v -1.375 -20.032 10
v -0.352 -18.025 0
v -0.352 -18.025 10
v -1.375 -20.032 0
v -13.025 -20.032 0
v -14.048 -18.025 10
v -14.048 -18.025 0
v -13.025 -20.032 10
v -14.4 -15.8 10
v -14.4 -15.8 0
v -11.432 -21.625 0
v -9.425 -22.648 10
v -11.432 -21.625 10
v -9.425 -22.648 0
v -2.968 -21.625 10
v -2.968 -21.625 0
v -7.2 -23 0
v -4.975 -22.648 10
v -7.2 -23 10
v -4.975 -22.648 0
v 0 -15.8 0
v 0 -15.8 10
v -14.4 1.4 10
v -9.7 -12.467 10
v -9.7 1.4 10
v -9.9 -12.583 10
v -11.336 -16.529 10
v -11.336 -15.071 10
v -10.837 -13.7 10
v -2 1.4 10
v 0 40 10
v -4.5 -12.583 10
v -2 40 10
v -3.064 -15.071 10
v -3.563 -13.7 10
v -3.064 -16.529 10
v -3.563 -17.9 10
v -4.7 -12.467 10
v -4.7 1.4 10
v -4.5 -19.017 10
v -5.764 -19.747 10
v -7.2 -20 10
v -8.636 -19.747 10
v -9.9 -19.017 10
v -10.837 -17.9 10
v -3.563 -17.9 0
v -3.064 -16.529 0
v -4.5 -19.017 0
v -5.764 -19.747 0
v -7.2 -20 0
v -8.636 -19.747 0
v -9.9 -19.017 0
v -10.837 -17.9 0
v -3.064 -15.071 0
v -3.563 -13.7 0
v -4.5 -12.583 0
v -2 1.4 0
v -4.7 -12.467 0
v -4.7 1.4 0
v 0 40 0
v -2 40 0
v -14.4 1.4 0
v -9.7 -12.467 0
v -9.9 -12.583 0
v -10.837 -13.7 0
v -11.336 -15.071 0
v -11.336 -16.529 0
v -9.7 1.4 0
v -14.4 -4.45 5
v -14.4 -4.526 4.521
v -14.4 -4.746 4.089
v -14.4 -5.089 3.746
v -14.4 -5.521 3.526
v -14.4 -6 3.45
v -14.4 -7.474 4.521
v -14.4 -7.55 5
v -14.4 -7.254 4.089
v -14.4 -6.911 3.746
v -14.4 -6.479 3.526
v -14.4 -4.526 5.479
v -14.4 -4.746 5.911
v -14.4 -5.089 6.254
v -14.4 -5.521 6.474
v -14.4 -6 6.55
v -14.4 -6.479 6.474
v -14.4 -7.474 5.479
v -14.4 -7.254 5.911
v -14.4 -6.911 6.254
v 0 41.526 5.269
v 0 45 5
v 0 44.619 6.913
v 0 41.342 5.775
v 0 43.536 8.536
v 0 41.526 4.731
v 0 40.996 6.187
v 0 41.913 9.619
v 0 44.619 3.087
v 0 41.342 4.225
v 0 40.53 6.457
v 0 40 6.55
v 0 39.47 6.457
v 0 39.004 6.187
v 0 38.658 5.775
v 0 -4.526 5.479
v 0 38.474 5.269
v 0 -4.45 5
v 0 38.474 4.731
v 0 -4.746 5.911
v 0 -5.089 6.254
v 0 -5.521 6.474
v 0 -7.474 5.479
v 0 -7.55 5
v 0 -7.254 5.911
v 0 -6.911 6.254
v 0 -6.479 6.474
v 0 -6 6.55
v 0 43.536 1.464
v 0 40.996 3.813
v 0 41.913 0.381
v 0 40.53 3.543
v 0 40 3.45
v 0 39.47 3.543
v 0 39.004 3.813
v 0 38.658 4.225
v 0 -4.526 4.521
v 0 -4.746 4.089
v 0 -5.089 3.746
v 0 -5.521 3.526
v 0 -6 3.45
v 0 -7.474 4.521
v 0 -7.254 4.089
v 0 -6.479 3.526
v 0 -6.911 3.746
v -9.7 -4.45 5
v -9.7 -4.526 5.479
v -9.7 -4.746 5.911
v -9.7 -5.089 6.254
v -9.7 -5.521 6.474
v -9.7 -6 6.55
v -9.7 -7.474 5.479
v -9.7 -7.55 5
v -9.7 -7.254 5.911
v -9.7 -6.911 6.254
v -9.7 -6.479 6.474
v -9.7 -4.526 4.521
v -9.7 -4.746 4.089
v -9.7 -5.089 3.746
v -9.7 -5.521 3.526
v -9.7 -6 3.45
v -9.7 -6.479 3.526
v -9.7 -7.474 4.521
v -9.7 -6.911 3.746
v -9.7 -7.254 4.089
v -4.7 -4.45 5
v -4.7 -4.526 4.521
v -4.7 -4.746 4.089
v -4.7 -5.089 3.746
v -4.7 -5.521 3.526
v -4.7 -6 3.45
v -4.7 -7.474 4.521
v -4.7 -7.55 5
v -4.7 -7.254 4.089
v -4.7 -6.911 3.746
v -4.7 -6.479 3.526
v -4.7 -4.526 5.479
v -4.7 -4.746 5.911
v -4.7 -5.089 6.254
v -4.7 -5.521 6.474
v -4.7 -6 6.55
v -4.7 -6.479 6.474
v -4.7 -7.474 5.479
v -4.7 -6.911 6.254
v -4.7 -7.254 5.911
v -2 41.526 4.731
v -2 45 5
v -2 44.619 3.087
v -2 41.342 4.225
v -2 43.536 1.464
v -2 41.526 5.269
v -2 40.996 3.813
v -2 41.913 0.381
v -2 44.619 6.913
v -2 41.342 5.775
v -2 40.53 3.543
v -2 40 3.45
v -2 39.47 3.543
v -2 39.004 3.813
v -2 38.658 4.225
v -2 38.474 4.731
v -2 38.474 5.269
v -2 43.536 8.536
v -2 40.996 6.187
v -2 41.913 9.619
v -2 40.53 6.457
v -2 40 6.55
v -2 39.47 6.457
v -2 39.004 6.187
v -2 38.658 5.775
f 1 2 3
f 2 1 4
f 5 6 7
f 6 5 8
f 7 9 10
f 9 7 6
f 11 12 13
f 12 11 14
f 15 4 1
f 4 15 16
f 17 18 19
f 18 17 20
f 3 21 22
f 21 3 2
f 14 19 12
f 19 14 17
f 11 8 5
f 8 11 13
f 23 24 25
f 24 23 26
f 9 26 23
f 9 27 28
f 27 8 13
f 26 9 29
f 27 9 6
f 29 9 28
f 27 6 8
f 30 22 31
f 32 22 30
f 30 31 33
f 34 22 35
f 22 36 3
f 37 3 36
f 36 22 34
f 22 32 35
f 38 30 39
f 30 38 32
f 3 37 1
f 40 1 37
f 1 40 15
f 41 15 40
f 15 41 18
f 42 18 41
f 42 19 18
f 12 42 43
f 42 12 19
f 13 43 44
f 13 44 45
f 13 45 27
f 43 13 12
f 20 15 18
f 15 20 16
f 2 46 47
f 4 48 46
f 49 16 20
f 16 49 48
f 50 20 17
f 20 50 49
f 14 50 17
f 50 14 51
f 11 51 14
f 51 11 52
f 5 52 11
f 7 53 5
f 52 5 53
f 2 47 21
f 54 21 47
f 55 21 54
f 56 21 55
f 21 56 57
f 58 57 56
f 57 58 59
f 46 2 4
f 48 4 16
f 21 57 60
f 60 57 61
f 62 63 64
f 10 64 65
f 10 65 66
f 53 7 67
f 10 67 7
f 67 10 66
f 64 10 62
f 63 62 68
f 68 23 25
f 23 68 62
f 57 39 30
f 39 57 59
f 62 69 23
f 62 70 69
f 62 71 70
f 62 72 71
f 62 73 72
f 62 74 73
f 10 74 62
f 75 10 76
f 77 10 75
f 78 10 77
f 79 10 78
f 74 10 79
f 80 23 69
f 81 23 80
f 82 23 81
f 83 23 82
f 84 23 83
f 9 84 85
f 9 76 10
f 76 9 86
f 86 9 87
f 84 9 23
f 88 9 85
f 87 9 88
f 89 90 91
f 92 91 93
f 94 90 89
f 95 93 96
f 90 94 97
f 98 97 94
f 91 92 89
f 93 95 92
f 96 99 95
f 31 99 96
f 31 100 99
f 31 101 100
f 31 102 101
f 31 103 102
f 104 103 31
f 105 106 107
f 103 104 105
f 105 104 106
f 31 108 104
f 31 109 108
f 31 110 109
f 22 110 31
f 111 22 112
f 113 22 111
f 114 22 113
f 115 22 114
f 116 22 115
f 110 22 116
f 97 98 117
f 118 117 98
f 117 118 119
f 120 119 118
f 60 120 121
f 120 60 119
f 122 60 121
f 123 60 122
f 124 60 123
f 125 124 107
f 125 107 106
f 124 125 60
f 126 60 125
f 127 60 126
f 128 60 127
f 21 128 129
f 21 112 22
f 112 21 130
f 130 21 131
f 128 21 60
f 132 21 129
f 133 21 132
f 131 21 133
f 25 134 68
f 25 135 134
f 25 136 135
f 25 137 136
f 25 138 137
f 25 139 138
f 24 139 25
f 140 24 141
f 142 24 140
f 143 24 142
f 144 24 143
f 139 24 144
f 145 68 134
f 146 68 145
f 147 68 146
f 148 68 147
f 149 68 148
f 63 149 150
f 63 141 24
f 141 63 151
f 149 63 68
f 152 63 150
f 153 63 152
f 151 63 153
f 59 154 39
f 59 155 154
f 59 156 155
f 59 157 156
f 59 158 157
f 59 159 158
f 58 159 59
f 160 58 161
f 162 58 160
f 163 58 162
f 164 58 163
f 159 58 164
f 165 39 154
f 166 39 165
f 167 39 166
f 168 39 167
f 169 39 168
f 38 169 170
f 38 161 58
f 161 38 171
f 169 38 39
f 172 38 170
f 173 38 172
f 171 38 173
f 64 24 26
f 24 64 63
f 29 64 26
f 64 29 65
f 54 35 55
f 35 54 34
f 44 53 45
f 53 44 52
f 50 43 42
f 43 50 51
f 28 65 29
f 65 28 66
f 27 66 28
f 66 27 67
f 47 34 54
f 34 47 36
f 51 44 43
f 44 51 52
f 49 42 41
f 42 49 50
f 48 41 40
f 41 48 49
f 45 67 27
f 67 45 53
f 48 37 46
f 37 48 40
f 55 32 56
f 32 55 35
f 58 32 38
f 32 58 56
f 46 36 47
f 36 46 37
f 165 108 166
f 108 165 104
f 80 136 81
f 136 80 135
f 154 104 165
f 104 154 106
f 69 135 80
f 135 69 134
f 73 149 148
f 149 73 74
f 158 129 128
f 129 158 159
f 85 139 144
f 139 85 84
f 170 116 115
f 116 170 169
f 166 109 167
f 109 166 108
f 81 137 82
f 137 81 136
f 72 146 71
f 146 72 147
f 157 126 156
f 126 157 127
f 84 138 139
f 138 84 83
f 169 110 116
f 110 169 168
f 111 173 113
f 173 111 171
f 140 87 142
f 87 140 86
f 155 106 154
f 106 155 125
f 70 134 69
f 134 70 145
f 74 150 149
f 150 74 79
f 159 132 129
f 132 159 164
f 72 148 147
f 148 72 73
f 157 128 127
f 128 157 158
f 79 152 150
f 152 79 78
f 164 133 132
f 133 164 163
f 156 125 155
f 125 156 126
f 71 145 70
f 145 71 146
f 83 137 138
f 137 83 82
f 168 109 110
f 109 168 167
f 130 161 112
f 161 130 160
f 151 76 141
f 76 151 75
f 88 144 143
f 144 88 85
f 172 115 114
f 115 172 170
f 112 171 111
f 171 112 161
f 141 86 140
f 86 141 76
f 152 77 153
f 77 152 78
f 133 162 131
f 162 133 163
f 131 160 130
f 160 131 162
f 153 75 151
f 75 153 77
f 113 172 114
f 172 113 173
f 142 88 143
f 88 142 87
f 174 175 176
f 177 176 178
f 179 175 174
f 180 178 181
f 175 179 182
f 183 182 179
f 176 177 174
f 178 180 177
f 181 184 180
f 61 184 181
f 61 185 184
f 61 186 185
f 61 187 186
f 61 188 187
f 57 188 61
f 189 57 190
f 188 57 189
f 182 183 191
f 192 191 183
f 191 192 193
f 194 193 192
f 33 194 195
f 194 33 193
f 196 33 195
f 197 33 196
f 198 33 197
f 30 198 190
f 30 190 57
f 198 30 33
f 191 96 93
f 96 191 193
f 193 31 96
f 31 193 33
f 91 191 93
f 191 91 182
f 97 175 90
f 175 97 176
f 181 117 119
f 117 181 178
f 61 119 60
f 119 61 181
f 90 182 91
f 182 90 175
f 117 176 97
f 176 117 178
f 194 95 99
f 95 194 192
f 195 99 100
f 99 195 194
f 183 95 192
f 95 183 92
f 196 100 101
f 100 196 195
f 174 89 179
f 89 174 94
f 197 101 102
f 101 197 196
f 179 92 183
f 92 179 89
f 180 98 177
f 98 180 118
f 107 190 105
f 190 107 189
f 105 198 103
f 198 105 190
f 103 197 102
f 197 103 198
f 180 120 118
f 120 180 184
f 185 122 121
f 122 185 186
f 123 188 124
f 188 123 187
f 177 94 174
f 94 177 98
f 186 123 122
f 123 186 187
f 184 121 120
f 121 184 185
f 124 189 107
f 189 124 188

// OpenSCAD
/**
 * extruder bar mount
 * allows standard extruder to be mounted at an angle to the frame for a bit more z height
 */ 

m8_diameter = 8.4;
m3_diameter = 3.1;
arm_length = 40;

module barclamp(){
outer_diameter_y = (m8_diameter-0.0)/2+3;
outer_diameter_z = outer_diameter_y;
//outer_diameter_z = 5;

difference(){
	union(){
		
		translate([outer_diameter_y, outer_diameter_y, 0])cylinder(h =10, r = outer_diameter_y, $fn = 20);
		translate([outer_diameter_y, 0, 0])cube([outer_diameter_y+10,outer_diameter_y*2,10]);
		//translate([18, 2*outer_diameter_y, outer_diameter_z])rotate([90, 0, 0]) rotate([0, 0, 0])
		//nut(outer_diameter_z*2,outer_diameter_y*2,false);
	}


	translate([19, outer_diameter_y, 9]) #cube([19,5,20], center=true);
	translate([outer_diameter_y, outer_diameter_y, -1]) cylinder(h =20, r = m8_diameter/2, $fn = 18);
	translate([17, 17, 5]) rotate([90, 0, 0]) cylinder(h =80, r = m3_diameter/2, $fn = 20);
}
}

rotate(a=[0,0,90]){
translate([-23,0,0]) barclamp();
}
rotate(a=[0,270,0]){
difference()
{
union(){
cube([10,arm_length,2]);
//translate([5,1,0]) cylinder(2,5,5);
translate([5,arm_length,0])cylinder(2,5,5);
}
//translate([5,1,0]) cylinder(4,1.7,1.7);
translate([5,arm_length,0]) cylinder(4,m3_diameter/2,m3_diameter/2,$fn=18);
}
}
